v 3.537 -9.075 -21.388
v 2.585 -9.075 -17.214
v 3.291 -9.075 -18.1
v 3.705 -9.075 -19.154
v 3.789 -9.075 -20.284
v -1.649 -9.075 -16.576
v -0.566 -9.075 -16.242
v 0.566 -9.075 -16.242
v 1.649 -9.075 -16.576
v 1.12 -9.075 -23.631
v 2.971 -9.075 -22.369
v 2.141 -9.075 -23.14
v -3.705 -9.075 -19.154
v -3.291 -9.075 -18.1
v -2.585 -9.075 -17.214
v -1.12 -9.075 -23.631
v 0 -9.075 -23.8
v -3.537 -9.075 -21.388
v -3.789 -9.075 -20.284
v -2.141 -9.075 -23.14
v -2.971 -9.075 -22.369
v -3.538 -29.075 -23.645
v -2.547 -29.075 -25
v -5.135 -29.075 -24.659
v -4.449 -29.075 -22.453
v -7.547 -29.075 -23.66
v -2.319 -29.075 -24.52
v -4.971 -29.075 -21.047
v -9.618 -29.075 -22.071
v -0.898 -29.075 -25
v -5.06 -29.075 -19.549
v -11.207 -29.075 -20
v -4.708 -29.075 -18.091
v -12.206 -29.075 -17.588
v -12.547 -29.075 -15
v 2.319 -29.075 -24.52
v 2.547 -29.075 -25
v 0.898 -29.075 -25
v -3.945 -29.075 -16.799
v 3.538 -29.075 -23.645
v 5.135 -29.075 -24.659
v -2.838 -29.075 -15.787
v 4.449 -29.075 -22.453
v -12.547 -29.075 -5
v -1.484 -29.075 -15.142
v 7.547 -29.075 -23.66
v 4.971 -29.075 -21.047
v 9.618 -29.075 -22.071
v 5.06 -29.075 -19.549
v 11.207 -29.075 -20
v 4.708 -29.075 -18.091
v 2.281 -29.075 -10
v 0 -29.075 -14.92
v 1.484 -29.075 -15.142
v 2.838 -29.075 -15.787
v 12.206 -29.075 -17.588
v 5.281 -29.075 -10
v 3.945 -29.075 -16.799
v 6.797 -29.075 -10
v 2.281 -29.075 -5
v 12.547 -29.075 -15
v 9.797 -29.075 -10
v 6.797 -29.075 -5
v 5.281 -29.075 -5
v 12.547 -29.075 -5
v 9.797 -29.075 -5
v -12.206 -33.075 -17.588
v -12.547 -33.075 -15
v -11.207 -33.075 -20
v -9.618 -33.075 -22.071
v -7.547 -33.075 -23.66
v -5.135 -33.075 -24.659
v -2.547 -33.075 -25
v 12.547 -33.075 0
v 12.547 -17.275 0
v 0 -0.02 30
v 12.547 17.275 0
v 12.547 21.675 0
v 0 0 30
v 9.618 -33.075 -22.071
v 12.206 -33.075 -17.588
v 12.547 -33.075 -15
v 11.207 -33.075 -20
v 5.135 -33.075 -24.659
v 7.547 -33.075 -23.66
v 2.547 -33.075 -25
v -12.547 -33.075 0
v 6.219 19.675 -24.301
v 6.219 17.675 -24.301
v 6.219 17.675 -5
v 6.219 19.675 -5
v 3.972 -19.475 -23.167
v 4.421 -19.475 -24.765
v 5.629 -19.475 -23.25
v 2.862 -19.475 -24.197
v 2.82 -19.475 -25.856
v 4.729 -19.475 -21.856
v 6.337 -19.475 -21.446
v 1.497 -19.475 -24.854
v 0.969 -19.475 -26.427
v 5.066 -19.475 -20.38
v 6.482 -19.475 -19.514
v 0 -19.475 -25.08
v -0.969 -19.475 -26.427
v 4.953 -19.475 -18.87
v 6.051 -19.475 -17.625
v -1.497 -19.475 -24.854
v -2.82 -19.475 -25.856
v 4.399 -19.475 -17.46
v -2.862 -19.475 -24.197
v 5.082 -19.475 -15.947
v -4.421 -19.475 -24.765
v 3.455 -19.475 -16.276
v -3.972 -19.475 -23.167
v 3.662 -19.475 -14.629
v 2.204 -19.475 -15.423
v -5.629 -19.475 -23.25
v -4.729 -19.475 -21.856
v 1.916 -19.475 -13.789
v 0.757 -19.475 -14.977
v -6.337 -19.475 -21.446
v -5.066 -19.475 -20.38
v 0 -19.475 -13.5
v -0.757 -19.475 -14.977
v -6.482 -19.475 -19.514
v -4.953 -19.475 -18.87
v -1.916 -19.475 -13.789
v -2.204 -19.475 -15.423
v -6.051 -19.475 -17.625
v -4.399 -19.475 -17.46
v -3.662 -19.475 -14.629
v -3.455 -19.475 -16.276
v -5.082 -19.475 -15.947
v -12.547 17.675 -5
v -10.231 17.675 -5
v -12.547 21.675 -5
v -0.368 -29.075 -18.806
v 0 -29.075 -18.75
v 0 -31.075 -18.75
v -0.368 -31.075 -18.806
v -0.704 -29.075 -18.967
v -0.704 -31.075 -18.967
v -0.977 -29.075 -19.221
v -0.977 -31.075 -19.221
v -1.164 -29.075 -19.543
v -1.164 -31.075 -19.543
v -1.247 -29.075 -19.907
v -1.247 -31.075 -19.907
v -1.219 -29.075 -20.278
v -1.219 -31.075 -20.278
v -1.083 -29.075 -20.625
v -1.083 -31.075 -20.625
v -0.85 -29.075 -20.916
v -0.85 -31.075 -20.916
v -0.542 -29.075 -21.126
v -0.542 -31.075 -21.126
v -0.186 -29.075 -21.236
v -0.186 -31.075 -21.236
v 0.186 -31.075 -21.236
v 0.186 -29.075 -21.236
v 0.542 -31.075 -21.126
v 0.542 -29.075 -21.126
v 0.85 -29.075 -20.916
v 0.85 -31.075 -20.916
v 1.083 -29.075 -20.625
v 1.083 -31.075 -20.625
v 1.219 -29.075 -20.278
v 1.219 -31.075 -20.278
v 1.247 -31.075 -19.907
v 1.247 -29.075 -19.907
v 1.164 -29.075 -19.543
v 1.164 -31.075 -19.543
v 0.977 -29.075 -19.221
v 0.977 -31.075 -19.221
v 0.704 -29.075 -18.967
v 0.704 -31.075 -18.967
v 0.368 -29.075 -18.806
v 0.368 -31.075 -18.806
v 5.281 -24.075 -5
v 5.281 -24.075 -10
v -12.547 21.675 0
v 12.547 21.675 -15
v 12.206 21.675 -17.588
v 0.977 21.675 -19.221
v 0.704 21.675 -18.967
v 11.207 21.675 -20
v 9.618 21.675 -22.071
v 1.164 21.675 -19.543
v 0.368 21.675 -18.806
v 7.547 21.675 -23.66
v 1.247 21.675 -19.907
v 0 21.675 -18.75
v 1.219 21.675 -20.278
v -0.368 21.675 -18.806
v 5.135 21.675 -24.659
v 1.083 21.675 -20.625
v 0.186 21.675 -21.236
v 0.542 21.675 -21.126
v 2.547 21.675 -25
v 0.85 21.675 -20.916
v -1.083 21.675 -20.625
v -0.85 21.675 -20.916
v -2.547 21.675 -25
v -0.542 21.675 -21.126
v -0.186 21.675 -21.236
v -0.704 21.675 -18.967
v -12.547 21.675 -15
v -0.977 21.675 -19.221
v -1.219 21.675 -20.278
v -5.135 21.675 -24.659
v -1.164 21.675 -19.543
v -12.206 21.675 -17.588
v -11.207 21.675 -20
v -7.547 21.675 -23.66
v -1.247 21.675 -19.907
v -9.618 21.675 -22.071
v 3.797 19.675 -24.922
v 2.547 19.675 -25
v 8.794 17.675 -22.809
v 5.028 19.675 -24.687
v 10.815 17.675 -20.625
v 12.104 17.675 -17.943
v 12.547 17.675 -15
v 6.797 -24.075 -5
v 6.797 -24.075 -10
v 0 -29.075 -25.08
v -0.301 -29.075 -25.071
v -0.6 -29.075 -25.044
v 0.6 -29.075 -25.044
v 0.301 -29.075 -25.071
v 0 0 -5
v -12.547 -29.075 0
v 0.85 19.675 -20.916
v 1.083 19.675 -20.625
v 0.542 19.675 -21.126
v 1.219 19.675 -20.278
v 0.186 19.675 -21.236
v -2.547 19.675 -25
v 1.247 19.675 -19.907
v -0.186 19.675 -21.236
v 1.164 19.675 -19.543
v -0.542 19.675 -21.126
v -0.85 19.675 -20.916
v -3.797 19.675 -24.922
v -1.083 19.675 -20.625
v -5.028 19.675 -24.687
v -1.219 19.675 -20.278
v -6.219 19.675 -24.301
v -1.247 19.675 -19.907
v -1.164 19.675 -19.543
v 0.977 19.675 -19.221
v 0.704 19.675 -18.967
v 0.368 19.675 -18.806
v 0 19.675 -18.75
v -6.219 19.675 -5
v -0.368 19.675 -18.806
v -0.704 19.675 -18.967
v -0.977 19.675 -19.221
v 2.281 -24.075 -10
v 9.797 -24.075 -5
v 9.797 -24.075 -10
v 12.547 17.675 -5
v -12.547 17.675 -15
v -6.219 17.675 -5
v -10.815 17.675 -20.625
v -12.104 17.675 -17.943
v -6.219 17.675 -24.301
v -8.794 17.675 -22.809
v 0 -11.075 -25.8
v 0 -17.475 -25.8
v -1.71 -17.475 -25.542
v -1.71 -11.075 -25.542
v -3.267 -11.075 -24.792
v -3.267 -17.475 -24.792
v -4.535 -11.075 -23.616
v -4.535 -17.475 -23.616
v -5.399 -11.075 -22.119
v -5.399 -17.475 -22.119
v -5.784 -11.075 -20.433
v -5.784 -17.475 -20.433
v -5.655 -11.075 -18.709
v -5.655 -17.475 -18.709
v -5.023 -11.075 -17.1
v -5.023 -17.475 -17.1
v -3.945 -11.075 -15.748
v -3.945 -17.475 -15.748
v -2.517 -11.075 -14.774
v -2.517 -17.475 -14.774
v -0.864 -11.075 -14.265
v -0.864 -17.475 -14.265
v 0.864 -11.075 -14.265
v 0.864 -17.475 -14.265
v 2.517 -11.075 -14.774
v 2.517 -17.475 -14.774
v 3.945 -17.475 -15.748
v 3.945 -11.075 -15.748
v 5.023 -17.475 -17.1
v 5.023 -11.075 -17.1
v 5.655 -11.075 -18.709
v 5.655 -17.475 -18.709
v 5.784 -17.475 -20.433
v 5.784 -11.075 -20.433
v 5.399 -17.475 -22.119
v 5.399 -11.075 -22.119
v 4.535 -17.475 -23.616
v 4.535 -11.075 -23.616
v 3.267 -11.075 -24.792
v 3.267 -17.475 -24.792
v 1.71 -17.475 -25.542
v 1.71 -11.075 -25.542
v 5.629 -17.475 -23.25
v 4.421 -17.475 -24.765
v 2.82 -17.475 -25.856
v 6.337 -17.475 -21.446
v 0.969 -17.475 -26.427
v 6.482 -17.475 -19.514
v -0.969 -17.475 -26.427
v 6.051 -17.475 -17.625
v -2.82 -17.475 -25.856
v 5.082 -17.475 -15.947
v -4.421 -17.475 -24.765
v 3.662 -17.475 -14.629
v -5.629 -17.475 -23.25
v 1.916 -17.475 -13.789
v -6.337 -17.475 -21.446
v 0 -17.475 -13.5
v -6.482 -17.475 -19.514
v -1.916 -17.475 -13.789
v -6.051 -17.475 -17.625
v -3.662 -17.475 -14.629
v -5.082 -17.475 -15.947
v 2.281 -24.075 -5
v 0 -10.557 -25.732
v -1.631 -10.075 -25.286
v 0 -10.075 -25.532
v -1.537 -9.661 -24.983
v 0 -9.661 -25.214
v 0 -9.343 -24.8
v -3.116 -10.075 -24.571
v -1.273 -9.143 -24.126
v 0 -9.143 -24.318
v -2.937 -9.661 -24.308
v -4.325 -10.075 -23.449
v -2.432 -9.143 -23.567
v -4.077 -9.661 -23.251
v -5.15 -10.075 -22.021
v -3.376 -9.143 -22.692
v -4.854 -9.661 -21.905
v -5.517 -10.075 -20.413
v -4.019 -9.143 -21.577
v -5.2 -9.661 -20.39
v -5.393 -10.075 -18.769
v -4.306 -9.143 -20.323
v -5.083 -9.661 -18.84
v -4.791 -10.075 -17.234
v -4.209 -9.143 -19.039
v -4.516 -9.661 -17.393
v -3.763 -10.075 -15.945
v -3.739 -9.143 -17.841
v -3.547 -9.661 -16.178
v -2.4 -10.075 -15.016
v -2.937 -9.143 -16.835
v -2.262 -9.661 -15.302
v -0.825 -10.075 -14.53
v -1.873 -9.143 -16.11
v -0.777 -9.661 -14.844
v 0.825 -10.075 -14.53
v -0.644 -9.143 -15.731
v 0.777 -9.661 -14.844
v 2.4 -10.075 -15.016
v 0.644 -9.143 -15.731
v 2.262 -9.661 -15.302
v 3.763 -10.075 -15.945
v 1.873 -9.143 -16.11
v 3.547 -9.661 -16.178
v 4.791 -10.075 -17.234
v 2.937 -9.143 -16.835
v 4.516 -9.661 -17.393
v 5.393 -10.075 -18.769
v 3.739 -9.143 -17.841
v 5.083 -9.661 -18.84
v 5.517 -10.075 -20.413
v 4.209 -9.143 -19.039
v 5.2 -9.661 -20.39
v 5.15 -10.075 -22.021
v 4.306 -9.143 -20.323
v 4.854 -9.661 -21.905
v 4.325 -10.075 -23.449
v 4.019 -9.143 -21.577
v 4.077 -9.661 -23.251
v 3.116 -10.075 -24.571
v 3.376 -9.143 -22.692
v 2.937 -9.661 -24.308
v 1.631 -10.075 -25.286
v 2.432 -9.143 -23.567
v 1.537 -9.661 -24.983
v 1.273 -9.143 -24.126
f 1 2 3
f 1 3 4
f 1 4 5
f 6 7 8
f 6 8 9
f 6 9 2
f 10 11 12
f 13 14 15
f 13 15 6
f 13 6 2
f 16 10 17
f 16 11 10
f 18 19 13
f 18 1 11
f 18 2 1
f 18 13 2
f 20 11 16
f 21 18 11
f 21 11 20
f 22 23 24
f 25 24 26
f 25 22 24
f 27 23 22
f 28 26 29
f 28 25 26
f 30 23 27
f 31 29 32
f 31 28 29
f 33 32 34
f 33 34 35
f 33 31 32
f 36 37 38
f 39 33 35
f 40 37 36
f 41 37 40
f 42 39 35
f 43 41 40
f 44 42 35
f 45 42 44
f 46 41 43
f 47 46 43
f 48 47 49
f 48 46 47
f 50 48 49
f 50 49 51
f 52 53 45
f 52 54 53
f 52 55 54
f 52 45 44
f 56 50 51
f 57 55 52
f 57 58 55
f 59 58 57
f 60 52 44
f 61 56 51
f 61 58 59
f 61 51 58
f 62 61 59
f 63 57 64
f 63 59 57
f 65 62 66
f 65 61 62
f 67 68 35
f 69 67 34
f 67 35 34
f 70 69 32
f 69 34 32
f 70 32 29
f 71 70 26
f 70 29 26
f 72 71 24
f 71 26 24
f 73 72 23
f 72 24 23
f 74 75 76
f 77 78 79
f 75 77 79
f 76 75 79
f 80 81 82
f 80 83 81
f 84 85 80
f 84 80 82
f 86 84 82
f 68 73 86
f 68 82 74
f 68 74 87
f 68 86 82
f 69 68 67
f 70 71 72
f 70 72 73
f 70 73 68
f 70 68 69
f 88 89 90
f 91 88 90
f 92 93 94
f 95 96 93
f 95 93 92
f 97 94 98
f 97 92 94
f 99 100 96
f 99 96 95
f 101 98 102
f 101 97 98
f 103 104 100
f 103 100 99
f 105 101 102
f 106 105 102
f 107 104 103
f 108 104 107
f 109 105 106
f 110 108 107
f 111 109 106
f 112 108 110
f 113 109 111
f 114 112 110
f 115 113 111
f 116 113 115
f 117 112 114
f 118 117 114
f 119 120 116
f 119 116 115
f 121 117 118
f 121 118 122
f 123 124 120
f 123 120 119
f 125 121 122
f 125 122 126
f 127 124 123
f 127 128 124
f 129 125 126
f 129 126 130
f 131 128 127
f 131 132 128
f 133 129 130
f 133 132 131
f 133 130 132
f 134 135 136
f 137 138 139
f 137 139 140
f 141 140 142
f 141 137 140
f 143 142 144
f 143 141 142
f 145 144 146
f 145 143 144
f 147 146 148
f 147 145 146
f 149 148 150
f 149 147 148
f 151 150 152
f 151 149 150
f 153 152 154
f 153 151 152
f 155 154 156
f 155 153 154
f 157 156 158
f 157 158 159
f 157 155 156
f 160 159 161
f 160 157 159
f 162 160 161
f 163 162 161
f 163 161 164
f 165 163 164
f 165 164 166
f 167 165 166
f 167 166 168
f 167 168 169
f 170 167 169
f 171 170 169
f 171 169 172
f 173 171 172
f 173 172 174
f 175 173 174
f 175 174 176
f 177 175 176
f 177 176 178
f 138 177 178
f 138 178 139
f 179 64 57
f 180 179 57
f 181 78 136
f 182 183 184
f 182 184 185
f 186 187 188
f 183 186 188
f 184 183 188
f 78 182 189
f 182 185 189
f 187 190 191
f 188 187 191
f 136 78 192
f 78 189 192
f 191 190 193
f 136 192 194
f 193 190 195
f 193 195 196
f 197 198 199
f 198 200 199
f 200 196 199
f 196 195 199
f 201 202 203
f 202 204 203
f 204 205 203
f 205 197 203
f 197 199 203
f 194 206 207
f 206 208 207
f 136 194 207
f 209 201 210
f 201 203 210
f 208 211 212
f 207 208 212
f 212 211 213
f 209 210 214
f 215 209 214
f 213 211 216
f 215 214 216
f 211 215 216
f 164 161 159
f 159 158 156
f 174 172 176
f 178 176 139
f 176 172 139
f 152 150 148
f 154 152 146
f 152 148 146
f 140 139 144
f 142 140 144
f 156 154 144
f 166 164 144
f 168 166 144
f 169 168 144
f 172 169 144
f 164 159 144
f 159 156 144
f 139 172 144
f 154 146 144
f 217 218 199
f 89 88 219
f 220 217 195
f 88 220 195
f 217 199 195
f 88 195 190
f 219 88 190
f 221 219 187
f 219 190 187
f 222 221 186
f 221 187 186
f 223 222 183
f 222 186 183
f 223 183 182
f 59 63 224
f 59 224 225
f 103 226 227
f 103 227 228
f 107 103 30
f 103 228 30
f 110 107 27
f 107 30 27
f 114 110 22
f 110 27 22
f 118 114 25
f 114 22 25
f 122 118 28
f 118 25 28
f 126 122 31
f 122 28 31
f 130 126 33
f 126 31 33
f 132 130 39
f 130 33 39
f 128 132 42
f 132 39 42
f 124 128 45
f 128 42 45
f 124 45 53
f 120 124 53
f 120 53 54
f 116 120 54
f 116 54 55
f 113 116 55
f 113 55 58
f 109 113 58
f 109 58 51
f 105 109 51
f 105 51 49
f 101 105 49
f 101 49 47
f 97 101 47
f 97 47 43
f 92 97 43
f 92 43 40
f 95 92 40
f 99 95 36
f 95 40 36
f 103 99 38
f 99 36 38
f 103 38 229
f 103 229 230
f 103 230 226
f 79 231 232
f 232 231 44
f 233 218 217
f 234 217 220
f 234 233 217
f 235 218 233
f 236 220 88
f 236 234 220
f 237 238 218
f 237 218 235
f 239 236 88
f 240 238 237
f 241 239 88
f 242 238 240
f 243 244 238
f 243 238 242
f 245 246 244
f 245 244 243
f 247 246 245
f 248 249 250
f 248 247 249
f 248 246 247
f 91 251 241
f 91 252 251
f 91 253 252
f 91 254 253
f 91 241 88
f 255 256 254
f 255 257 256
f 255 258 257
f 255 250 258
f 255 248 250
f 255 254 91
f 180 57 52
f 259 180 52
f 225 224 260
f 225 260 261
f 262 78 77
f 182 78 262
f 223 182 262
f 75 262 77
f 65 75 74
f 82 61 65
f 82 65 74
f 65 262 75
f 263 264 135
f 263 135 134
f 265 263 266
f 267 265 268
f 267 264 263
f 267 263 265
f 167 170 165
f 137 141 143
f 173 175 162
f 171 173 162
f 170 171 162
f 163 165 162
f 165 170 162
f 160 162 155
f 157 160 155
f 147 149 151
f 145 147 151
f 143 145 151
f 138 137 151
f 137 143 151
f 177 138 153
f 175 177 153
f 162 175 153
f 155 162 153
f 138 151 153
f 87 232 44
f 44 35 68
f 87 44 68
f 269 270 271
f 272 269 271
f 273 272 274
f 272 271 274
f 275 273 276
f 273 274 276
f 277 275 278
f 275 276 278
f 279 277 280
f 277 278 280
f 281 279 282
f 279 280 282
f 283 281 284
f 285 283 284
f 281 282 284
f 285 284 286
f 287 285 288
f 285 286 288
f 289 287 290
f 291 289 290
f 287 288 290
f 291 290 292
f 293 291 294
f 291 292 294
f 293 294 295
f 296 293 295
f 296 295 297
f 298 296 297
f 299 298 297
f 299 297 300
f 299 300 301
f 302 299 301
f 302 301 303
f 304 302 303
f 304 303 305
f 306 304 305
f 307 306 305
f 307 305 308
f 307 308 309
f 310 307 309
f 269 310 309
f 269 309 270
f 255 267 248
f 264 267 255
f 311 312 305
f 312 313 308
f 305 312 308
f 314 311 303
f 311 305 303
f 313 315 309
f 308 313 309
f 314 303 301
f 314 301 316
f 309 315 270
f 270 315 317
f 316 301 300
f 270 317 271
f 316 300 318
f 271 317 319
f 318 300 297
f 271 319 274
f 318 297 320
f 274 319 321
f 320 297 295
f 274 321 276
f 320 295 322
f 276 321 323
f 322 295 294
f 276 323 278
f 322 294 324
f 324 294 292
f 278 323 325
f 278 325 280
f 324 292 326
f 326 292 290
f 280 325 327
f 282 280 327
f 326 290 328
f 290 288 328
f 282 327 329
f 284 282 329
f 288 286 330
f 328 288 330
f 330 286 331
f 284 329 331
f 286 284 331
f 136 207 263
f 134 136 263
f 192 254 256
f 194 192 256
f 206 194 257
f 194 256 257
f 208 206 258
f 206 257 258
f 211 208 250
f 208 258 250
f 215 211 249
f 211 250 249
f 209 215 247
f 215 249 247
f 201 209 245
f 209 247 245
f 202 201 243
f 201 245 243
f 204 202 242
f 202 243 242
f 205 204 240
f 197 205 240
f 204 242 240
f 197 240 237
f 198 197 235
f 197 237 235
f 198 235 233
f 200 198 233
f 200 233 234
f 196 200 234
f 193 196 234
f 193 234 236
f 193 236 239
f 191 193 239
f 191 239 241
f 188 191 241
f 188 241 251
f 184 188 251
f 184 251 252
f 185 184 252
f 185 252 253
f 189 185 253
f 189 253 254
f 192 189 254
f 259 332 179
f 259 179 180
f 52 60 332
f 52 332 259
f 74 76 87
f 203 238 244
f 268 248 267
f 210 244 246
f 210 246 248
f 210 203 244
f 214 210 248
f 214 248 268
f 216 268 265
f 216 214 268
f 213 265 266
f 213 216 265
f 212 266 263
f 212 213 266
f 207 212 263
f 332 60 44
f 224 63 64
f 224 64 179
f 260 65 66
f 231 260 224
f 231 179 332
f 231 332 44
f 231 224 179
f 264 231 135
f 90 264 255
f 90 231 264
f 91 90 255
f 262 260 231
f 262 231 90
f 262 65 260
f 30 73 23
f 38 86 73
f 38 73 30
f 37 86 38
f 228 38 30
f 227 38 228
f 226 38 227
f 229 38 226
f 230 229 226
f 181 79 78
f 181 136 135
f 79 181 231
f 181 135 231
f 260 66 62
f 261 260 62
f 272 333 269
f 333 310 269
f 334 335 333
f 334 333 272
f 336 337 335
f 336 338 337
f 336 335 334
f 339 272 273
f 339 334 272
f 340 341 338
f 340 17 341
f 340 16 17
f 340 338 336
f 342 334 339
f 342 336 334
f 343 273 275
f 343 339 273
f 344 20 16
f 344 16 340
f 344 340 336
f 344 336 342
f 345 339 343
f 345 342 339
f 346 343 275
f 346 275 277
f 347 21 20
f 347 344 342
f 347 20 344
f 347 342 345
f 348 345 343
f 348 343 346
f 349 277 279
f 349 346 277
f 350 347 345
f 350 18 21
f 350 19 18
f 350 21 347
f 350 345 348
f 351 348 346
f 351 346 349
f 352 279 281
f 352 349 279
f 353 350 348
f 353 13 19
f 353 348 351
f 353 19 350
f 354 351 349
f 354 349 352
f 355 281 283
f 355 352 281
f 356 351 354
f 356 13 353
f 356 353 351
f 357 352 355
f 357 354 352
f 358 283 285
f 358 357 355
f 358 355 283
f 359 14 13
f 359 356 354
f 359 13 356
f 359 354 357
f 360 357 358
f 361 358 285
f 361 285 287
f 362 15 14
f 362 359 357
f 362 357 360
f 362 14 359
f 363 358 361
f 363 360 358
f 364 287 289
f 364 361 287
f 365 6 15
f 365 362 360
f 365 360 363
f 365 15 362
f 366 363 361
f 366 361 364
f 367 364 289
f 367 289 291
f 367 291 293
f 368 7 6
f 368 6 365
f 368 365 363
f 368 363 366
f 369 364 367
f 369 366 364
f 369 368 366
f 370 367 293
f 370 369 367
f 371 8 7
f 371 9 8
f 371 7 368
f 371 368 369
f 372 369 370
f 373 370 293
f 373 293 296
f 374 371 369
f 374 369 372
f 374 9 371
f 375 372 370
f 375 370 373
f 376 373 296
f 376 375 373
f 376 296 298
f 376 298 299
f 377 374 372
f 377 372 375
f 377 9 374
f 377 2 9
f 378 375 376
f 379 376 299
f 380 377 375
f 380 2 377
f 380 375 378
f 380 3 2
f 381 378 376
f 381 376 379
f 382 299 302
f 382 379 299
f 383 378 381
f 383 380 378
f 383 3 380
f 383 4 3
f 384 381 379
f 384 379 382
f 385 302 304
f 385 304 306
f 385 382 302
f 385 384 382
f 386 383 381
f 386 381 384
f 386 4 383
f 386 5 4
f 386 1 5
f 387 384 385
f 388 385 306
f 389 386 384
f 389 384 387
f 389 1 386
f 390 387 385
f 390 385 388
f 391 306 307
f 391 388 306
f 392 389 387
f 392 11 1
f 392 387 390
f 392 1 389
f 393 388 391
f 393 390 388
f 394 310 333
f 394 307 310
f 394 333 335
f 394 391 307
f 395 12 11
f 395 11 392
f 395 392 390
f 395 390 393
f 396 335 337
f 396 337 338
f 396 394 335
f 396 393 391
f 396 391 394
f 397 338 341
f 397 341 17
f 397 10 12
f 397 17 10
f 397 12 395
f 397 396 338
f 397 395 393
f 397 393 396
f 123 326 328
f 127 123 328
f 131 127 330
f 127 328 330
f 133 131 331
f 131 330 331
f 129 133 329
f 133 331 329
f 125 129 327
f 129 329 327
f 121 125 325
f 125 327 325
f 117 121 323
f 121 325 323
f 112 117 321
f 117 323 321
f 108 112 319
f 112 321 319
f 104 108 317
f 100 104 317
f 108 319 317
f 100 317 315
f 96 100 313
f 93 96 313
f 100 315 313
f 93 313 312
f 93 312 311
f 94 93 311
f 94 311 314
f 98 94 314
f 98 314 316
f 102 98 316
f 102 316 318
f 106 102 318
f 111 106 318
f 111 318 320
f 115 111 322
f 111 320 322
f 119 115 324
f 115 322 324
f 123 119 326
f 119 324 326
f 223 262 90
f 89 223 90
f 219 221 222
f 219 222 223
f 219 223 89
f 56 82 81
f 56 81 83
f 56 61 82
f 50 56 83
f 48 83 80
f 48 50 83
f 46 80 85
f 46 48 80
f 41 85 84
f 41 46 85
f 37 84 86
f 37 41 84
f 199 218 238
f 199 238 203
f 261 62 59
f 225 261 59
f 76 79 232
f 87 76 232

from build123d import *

# Parameters (mm, degrees)
SKETCH4_W                = 12.46
SKETCH4_H                = 17.25
BOSS_EXTRUDE3_DEPTH      = 6
SKETCH8_R                = 12.546781182
SKETCH8_R_2              = 11.15
BOSS_EXTRUDE6_DEPTH      = 7.3
BOSS_EXTRUDE6_DEPTH_BACK = 17.25
BOSS_EXTRUDE4_DEPTH      = 17.25
SKETCH6_R                = 0.5
CUT_EXTRUDE1_DEPTH       = 15
CHAMFER1_SIZE            = 0.5
CHAMFER1_SIZE2           = 0.866025404
SKETCH10_W               = 12.46
SKETCH10_H               = 23.7
CUT_EXTRUDE3_DEPTH       = 17.25
CUT_EXTRUDE4_REACH       = 38.097
SKETCH11_W               = 5
SKETCH11_H               = 3
BOSS_EXTRUDE7_DEPTH      = 7.3
BOSS_EXTRUDE9_DEPTH      = 10
SKETCH20_R               = 11.15
SKETCH20_R_2             = 7.15
BOSS_EXTRUDE11_DEPTH     = 7.3
SKETCH21_R               = 10.15
SKETCH21_R_2             = 7.15
CUT_EXTRUDE7_DEPTH       = 1.3
BOSS_EXTRUDE10_DEPTH     = 25.093562
SKETCH18_W               = 20
SKETCH18_H               = 12.438292938
CUT_EXTRUDE5_DEPTH       = 2
SKETCH19_R               = 1.25
CUT_EXTRUDE6_DEPTH       = 53.75
CUT_EXTRUDE6_DEPTH_BACK  = 3
FILLET1_R                = 10
SKETCH22_R               = 5.8
BOSS_EXTRUDE12_DEPTH     = 20
FILLET2_R                = 2
SKETCH23_R               = 5.930854157
SKETCH23_R_2             = 5.08
CUT_EXTRUDE8_DEPTH       = 11.6
SKETCH24_R               = 6.5
BOSS_EXTRUDE13_DEPTH     = 2
SKETCH25_R               = 1.25
BOSS_EXTRUDE14_DEPTH     = 2
SKETCH26_W               = 5
SKETCH26_H               = 3
BOSS_EXTRUDE15_DEPTH     = 5
SKETCH27_W               = 27.233314403
SKETCH27_H               = 38.605371191
CUT_EXTRUDE9_DEPTH       = 51.35
BOSS_EXTRUDE16_DEPTH     = 54.75
CUT_EXTRUDE10_DEPTH      = 13.546781182
CUT_EXTRUDE10_DEPTH_BACK = 13.546781182
CUT_EXTRUDE11_DEPTH      = 36


with BuildPart() as part:
    # Sketch4 → Boss-Extrude3 (new body)
    with BuildSketch(Plane.XY):
        with Locations((0, -1.35)):
            Rectangle(SKETCH4_W, SKETCH4_H)
    extrude(amount=BOSS_EXTRUDE3_DEPTH)



with BuildPart() as body_2:
    # Sketch8 → Boss-Extrude6 (new body, two sides)
    with BuildSketch(Plane(origin=(0, -9.975, 0), x_dir=(-1, 0, 0), z_dir=(0, -1, 0))) as boss_extrude6_sk:
        with Locations((0, -23.55)):
            Circle(SKETCH8_R)
        with Locations((0, -23.55)):
            Circle(SKETCH8_R_2, mode=Mode.SUBTRACT)
    extrude(amount=BOSS_EXTRUDE6_DEPTH)
    extrude(boss_extrude6_sk.sketch, amount=-BOSS_EXTRUDE6_DEPTH_BACK)


with BuildPart() as part_1:
    add(part.part)

    add(body_2.part)  # Boss-Extrude4 merges body 2
    # Sketch5 → Boss-Extrude4 (add)
    with BuildSketch(Plane(origin=(0, 7.275, 0), x_dir=(1, 0, 0), z_dir=(0, 1, 0))):
        with BuildLine():
            Line((12.546781182, -23.55), (12.546781182, 0))
            Line((12.546781182, 0), (6.23, 0))
            Line((6.23, 0), (6.23, -29.7))
            Line((6.23, -29.7), (-6.23, -29.7))
            Line((-6.23, -29.7), (-6.23, 0))
            Line((-6.23, 0), (-12.546781182, 0))
            Line((-12.546781182, 0), (-12.546781182, -23.55))
            ThreePointArc((-12.546781182, -23.55), (0, -36.096781182), (12.546781182, -23.55))
        make_face()
    extrude(amount=-BOSS_EXTRUDE4_DEPTH)

    # Sketch6 → Cut-Extrude1 (cut)
    with BuildSketch(Plane(origin=(0, 7.275, 0), x_dir=(1, 0, 0), z_dir=(0, 1, 0))):
        with Locations((0, -3.6)):
            Circle(SKETCH6_R)
        with Locations((0, -32.1)):
            Circle(SKETCH6_R)
    extrude(amount=-CUT_EXTRUDE1_DEPTH, mode=Mode.SUBTRACT)

    # Chamfer1
    chamfer1_edges = [part_1.edges().sort_by_distance(p)[0] for p in [
        (-0.5, 7.275, 3.6),
        (-0.5, 7.275, 32.1),
    ]]
    chamfer1_side = [part_1.faces().sort_by_distance(p)[0] for p in [
        (0, 7.275, 35.657160381),
    ]]
    chamfer(chamfer1_edges, length=CHAMFER1_SIZE, length2=CHAMFER1_SIZE2, reference=chamfer1_side[0])

    # Sketch10 → Cut-Extrude3 (cut)
    with BuildSketch(Plane(origin=(0, 7.275, 0), x_dir=(1, 0, 0), z_dir=(0, 1, 0))):
        with Locations((0, -17.85)):
            Rectangle(SKETCH10_W, SKETCH10_H)
    extrude(amount=-CUT_EXTRUDE3_DEPTH, mode=Mode.SUBTRACT)

    # Sketch11 → Cut-Extrude4 (cut, up to next)
    with BuildSketch(Plane.XY.offset(36.096781182), mode=Mode.PRIVATE) as cut_extrude4_sk1:
        with Locations((0, -8.475)):
            Rectangle(SKETCH11_W, SKETCH11_H)
    cut_extrude4_tool1 = extrude(cut_extrude4_sk1.sketch, amount=-CUT_EXTRUDE4_REACH, mode=Mode.PRIVATE) & part_1.part
    add(cut_extrude4_tool1.solids().sort_by_distance((0, -8.475, 36.096781))[0], mode=Mode.SUBTRACT)

    # Sketch13 → Boss-Extrude7 (add)
    with BuildSketch(Plane.XZ.offset(17.275)):
        with BuildLine():
            Line((-12.546781182, 23.55), (-12.546781182, 0))
            Line((-12.546781182, 0), (12.546781182, 0))
            Line((12.546781182, 0), (12.546781182, 23.55))
            ThreePointArc((12.546781182, 23.55), (0, 11.003218818), (-12.546781182, 23.55))
        make_face()
    extrude(amount=-BOSS_EXTRUDE7_DEPTH)

    # Sketch15 → Boss-Extrude9 (add)
    with BuildSketch(Plane(origin=(0, 7.275, 0), x_dir=(1, 0, 0), z_dir=(0, 1, 0))):
        with BuildLine():
            Line((-12.546781182, 0), (12.546781182, 0))
            Line((12.546781182, 0), (12.546781182, -23.55))
            ThreePointArc((12.546781182, -23.55), (0, -36.096781182), (-12.546781182, -23.55))
            Line((-12.546781182, -23.55), (-12.546781182, 0))
        make_face()
        with BuildLine():
            Line((-6.23, -0.8), (6.23, -0.8))
            Line((6.23, -0.8), (6.23, -33.5))
            ThreePointArc((6.23, -33.5), (5.937106781, -34.207106781), (5.23, -34.5))
            Line((5.23, -34.5), (-5.23, -34.5))
            ThreePointArc((-5.23, -34.5), (-5.937106781, -34.207106781), (-6.23, -33.5))
            Line((-6.23, -33.5), (-6.23, -0.8))
        make_face(mode=Mode.SUBTRACT)
    extrude(amount=BOSS_EXTRUDE9_DEPTH)

    # Sketch20 → Boss-Extrude11 (add)
    with BuildSketch(Plane.XZ.offset(17.275)):
        with Locations((0, 23.55)):
            Circle(SKETCH20_R)
        with Locations((0, 23.55)):
            Circle(SKETCH20_R_2, mode=Mode.SUBTRACT)
    extrude(amount=-BOSS_EXTRUDE11_DEPTH)

    # Sketch21 → Cut-Extrude7 (cut)
    with BuildSketch(Plane.XZ.offset(17.275)):
        with Locations((0, 23.55)):
            Circle(SKETCH21_R)
        with Locations((0, 23.55)):
            Circle(SKETCH21_R_2, mode=Mode.SUBTRACT)
    extrude(amount=-CUT_EXTRUDE7_DEPTH, mode=Mode.SUBTRACT)

    # Sketch17 → Boss-Extrude10 (add)
    with BuildSketch(Plane(origin=(12.546781182, 4.728218818, 0), x_dir=(0, 1, 0), z_dir=(-1, 0, 0))):
        Polygon((16.946781182, 25), (16.946781182, 0), (-37.803218818, 0), (-37.803218818, 25), (-33.803218818, 25), (-33.803218818, 5), (12.946781182, 5), (12.946781182, 25), align=None)
    extrude(amount=BOSS_EXTRUDE10_DEPTH)

    # Sketch18 → Cut-Extrude5 (cut)
    with BuildSketch(Plane(origin=(0, 17.675, 0), x_dir=(0, 0, 1), z_dir=(0, -1, 0))):
        with Locations((-15, 0)):
            Rectangle(SKETCH18_W, SKETCH18_H)
    extrude(amount=-CUT_EXTRUDE5_DEPTH, mode=Mode.SUBTRACT)

    # Sketch19 → Cut-Extrude6 (cut, two sides)
    with BuildSketch(Plane(origin=(0, 19.675, 0), x_dir=(0, 0, 1), z_dir=(0, -1, 0))) as cut_extrude6_sk:
        with Locations((-20, 0)):
            Circle(SKETCH19_R)
    extrude(amount=CUT_EXTRUDE6_DEPTH, mode=Mode.SUBTRACT)
    extrude(cut_extrude6_sk.sketch, amount=-CUT_EXTRUDE6_DEPTH_BACK, mode=Mode.SUBTRACT)

    # Fillet1
    fillet1_edges = [part_1.edges().sort_by_distance(p)[0] for p in [
        (-12.546780818, 19.675, -25),
        (12.546781182, 19.675, -25),
        (12.546781182, -31.075, -25),
        (-12.546780818, -31.075, -25),
    ]]
    fillet(fillet1_edges, radius=FILLET1_R)

    # Sketch22 → Boss-Extrude12 (add)
    with BuildSketch(Plane(origin=(0, -29.075, 0), x_dir=(0, 0, -1), z_dir=(0, 1, 0))):
        with Locations((20, 0)):
            Circle(SKETCH22_R)
    extrude(amount=BOSS_EXTRUDE12_DEPTH)

    # Fillet2
    fillet2_edges = [part_1.edges().sort_by_distance(p)[0] for p in [
        (0, -9.075, -14.2),
    ]]
    fillet(fillet2_edges, radius=FILLET2_R)

    # Sketch23 → Cut-Extrude8 (cut)
    with BuildSketch(Plane(origin=(0, -29.075, 0), x_dir=(0, 0, -1), z_dir=(0, 1, 0))):
        with Locations((20, 0)):
            Circle(SKETCH23_R)
        with Locations((20, 0)):
            Circle(SKETCH23_R_2, mode=Mode.SUBTRACT)
    extrude(amount=CUT_EXTRUDE8_DEPTH, mode=Mode.SUBTRACT)

    # Sketch24 → Boss-Extrude13 (add)
    with BuildSketch(Plane(origin=(0, -17.475, 0), x_dir=(0, 0, 1), z_dir=(0, -1, 0))):
        with Locations((-20, 0)):
            Circle(SKETCH24_R)
    extrude(amount=BOSS_EXTRUDE13_DEPTH)

    # Sketch25 → Boss-Extrude14 (add)
    with BuildSketch(Plane(origin=(0, -33.075, 0), x_dir=(0, 0, 1), z_dir=(0, -1, 0))):
        with Locations((-20, 0)):
            Circle(SKETCH25_R)
    extrude(amount=-BOSS_EXTRUDE14_DEPTH)

    # Sketch26 → Boss-Extrude15 (add)
    with BuildSketch(Plane(origin=(0, -29.075, 0), x_dir=(0, 0, -1), z_dir=(0, 1, 0))):
        with Locations((7.5, -8.296781182)):
            Rectangle(SKETCH26_W, SKETCH26_H)
        with Locations((7.5, -3.780781182)):
            Rectangle(SKETCH26_W, SKETCH26_H)
    extrude(amount=BOSS_EXTRUDE15_DEPTH)

    # Sketch27 → Cut-Extrude9 (cut, through all)
    with BuildSketch(Plane(origin=(0, 17.275, 0), x_dir=(1, 0, 0), z_dir=(0, 1, 0))):
        with Locations((1.06987602, -19.302685596)):
            Rectangle(SKETCH27_W, SKETCH27_H)
    extrude(amount=-CUT_EXTRUDE9_DEPTH, mode=Mode.SUBTRACT)

    # Sketch28 → Boss-Extrude16 (add)
    with BuildSketch(Plane(origin=(0, 21.675, 0), x_dir=(1, 0, 0), z_dir=(0, 1, 0))):
        Polygon((12.546781182, 0), (0, -30), (-12.546781182, 0), align=None)
    extrude(amount=-BOSS_EXTRUDE16_DEPTH)

    # Sketch29 → Cut-Extrude10 (cut, two sides)
    with BuildSketch(Plane(origin=(0, 0, 0), x_dir=(0, 0, -1), z_dir=(1, 0, 0))) as cut_extrude10_sk:
        Polygon((0, 21.675), (-30, 21.675), (-30, 0), align=None)
        Polygon((0, -33.075), (-30, -33.075), (-30, -0.02), align=None)
    extrude(amount=CUT_EXTRUDE10_DEPTH, mode=Mode.SUBTRACT)
    extrude(cut_extrude10_sk.sketch, amount=-CUT_EXTRUDE10_DEPTH_BACK, mode=Mode.SUBTRACT)

    # Sketch30 → Cut-Extrude11 (cut, through all)
    with BuildSketch(Plane(origin=(0, 0, -5), x_dir=(-1, 0, 0), z_dir=(0, 0, -1))):
        Polygon((12.546781182, 21.675), (0, 0), (12.546781182, -29.075), align=None)
    extrude(amount=-CUT_EXTRUDE11_DEPTH, mode=Mode.SUBTRACT)


solid = part_1.part
